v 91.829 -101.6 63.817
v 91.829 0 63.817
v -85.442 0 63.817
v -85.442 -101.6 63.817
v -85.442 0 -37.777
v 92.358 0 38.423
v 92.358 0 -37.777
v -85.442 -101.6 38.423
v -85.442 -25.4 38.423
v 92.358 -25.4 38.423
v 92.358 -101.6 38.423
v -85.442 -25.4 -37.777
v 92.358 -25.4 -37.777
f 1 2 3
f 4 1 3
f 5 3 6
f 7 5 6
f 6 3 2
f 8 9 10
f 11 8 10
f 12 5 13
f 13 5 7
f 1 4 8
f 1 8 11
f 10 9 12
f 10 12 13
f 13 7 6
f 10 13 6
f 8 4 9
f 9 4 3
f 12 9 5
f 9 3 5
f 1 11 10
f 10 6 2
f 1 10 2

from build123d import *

# Parameters (mm, degrees)
F0_W     = 177.8
F0_H     = 76.2
F1_DEPTH = 25.4
F2_DEPTH = 101.6


with BuildPart() as f1:
    # F0 (on Front) → F1 (new body)
    with BuildSketch(Plane.XZ):
        with Locations((3.457811, 0.322963)):
            Rectangle(F0_W, F0_H)
    extrude(amount=F1_DEPTH)

    # F0 (on Front) → F2 (join)
    with BuildSketch(Plane.XZ):
        Polygon((-85.442189, 63.817453), (-85.442189, 38.422963), (92.357811, 38.422963), (91.828754, 63.817453), align=None)
    extrude(amount=F2_DEPTH)


solid = f1.part
